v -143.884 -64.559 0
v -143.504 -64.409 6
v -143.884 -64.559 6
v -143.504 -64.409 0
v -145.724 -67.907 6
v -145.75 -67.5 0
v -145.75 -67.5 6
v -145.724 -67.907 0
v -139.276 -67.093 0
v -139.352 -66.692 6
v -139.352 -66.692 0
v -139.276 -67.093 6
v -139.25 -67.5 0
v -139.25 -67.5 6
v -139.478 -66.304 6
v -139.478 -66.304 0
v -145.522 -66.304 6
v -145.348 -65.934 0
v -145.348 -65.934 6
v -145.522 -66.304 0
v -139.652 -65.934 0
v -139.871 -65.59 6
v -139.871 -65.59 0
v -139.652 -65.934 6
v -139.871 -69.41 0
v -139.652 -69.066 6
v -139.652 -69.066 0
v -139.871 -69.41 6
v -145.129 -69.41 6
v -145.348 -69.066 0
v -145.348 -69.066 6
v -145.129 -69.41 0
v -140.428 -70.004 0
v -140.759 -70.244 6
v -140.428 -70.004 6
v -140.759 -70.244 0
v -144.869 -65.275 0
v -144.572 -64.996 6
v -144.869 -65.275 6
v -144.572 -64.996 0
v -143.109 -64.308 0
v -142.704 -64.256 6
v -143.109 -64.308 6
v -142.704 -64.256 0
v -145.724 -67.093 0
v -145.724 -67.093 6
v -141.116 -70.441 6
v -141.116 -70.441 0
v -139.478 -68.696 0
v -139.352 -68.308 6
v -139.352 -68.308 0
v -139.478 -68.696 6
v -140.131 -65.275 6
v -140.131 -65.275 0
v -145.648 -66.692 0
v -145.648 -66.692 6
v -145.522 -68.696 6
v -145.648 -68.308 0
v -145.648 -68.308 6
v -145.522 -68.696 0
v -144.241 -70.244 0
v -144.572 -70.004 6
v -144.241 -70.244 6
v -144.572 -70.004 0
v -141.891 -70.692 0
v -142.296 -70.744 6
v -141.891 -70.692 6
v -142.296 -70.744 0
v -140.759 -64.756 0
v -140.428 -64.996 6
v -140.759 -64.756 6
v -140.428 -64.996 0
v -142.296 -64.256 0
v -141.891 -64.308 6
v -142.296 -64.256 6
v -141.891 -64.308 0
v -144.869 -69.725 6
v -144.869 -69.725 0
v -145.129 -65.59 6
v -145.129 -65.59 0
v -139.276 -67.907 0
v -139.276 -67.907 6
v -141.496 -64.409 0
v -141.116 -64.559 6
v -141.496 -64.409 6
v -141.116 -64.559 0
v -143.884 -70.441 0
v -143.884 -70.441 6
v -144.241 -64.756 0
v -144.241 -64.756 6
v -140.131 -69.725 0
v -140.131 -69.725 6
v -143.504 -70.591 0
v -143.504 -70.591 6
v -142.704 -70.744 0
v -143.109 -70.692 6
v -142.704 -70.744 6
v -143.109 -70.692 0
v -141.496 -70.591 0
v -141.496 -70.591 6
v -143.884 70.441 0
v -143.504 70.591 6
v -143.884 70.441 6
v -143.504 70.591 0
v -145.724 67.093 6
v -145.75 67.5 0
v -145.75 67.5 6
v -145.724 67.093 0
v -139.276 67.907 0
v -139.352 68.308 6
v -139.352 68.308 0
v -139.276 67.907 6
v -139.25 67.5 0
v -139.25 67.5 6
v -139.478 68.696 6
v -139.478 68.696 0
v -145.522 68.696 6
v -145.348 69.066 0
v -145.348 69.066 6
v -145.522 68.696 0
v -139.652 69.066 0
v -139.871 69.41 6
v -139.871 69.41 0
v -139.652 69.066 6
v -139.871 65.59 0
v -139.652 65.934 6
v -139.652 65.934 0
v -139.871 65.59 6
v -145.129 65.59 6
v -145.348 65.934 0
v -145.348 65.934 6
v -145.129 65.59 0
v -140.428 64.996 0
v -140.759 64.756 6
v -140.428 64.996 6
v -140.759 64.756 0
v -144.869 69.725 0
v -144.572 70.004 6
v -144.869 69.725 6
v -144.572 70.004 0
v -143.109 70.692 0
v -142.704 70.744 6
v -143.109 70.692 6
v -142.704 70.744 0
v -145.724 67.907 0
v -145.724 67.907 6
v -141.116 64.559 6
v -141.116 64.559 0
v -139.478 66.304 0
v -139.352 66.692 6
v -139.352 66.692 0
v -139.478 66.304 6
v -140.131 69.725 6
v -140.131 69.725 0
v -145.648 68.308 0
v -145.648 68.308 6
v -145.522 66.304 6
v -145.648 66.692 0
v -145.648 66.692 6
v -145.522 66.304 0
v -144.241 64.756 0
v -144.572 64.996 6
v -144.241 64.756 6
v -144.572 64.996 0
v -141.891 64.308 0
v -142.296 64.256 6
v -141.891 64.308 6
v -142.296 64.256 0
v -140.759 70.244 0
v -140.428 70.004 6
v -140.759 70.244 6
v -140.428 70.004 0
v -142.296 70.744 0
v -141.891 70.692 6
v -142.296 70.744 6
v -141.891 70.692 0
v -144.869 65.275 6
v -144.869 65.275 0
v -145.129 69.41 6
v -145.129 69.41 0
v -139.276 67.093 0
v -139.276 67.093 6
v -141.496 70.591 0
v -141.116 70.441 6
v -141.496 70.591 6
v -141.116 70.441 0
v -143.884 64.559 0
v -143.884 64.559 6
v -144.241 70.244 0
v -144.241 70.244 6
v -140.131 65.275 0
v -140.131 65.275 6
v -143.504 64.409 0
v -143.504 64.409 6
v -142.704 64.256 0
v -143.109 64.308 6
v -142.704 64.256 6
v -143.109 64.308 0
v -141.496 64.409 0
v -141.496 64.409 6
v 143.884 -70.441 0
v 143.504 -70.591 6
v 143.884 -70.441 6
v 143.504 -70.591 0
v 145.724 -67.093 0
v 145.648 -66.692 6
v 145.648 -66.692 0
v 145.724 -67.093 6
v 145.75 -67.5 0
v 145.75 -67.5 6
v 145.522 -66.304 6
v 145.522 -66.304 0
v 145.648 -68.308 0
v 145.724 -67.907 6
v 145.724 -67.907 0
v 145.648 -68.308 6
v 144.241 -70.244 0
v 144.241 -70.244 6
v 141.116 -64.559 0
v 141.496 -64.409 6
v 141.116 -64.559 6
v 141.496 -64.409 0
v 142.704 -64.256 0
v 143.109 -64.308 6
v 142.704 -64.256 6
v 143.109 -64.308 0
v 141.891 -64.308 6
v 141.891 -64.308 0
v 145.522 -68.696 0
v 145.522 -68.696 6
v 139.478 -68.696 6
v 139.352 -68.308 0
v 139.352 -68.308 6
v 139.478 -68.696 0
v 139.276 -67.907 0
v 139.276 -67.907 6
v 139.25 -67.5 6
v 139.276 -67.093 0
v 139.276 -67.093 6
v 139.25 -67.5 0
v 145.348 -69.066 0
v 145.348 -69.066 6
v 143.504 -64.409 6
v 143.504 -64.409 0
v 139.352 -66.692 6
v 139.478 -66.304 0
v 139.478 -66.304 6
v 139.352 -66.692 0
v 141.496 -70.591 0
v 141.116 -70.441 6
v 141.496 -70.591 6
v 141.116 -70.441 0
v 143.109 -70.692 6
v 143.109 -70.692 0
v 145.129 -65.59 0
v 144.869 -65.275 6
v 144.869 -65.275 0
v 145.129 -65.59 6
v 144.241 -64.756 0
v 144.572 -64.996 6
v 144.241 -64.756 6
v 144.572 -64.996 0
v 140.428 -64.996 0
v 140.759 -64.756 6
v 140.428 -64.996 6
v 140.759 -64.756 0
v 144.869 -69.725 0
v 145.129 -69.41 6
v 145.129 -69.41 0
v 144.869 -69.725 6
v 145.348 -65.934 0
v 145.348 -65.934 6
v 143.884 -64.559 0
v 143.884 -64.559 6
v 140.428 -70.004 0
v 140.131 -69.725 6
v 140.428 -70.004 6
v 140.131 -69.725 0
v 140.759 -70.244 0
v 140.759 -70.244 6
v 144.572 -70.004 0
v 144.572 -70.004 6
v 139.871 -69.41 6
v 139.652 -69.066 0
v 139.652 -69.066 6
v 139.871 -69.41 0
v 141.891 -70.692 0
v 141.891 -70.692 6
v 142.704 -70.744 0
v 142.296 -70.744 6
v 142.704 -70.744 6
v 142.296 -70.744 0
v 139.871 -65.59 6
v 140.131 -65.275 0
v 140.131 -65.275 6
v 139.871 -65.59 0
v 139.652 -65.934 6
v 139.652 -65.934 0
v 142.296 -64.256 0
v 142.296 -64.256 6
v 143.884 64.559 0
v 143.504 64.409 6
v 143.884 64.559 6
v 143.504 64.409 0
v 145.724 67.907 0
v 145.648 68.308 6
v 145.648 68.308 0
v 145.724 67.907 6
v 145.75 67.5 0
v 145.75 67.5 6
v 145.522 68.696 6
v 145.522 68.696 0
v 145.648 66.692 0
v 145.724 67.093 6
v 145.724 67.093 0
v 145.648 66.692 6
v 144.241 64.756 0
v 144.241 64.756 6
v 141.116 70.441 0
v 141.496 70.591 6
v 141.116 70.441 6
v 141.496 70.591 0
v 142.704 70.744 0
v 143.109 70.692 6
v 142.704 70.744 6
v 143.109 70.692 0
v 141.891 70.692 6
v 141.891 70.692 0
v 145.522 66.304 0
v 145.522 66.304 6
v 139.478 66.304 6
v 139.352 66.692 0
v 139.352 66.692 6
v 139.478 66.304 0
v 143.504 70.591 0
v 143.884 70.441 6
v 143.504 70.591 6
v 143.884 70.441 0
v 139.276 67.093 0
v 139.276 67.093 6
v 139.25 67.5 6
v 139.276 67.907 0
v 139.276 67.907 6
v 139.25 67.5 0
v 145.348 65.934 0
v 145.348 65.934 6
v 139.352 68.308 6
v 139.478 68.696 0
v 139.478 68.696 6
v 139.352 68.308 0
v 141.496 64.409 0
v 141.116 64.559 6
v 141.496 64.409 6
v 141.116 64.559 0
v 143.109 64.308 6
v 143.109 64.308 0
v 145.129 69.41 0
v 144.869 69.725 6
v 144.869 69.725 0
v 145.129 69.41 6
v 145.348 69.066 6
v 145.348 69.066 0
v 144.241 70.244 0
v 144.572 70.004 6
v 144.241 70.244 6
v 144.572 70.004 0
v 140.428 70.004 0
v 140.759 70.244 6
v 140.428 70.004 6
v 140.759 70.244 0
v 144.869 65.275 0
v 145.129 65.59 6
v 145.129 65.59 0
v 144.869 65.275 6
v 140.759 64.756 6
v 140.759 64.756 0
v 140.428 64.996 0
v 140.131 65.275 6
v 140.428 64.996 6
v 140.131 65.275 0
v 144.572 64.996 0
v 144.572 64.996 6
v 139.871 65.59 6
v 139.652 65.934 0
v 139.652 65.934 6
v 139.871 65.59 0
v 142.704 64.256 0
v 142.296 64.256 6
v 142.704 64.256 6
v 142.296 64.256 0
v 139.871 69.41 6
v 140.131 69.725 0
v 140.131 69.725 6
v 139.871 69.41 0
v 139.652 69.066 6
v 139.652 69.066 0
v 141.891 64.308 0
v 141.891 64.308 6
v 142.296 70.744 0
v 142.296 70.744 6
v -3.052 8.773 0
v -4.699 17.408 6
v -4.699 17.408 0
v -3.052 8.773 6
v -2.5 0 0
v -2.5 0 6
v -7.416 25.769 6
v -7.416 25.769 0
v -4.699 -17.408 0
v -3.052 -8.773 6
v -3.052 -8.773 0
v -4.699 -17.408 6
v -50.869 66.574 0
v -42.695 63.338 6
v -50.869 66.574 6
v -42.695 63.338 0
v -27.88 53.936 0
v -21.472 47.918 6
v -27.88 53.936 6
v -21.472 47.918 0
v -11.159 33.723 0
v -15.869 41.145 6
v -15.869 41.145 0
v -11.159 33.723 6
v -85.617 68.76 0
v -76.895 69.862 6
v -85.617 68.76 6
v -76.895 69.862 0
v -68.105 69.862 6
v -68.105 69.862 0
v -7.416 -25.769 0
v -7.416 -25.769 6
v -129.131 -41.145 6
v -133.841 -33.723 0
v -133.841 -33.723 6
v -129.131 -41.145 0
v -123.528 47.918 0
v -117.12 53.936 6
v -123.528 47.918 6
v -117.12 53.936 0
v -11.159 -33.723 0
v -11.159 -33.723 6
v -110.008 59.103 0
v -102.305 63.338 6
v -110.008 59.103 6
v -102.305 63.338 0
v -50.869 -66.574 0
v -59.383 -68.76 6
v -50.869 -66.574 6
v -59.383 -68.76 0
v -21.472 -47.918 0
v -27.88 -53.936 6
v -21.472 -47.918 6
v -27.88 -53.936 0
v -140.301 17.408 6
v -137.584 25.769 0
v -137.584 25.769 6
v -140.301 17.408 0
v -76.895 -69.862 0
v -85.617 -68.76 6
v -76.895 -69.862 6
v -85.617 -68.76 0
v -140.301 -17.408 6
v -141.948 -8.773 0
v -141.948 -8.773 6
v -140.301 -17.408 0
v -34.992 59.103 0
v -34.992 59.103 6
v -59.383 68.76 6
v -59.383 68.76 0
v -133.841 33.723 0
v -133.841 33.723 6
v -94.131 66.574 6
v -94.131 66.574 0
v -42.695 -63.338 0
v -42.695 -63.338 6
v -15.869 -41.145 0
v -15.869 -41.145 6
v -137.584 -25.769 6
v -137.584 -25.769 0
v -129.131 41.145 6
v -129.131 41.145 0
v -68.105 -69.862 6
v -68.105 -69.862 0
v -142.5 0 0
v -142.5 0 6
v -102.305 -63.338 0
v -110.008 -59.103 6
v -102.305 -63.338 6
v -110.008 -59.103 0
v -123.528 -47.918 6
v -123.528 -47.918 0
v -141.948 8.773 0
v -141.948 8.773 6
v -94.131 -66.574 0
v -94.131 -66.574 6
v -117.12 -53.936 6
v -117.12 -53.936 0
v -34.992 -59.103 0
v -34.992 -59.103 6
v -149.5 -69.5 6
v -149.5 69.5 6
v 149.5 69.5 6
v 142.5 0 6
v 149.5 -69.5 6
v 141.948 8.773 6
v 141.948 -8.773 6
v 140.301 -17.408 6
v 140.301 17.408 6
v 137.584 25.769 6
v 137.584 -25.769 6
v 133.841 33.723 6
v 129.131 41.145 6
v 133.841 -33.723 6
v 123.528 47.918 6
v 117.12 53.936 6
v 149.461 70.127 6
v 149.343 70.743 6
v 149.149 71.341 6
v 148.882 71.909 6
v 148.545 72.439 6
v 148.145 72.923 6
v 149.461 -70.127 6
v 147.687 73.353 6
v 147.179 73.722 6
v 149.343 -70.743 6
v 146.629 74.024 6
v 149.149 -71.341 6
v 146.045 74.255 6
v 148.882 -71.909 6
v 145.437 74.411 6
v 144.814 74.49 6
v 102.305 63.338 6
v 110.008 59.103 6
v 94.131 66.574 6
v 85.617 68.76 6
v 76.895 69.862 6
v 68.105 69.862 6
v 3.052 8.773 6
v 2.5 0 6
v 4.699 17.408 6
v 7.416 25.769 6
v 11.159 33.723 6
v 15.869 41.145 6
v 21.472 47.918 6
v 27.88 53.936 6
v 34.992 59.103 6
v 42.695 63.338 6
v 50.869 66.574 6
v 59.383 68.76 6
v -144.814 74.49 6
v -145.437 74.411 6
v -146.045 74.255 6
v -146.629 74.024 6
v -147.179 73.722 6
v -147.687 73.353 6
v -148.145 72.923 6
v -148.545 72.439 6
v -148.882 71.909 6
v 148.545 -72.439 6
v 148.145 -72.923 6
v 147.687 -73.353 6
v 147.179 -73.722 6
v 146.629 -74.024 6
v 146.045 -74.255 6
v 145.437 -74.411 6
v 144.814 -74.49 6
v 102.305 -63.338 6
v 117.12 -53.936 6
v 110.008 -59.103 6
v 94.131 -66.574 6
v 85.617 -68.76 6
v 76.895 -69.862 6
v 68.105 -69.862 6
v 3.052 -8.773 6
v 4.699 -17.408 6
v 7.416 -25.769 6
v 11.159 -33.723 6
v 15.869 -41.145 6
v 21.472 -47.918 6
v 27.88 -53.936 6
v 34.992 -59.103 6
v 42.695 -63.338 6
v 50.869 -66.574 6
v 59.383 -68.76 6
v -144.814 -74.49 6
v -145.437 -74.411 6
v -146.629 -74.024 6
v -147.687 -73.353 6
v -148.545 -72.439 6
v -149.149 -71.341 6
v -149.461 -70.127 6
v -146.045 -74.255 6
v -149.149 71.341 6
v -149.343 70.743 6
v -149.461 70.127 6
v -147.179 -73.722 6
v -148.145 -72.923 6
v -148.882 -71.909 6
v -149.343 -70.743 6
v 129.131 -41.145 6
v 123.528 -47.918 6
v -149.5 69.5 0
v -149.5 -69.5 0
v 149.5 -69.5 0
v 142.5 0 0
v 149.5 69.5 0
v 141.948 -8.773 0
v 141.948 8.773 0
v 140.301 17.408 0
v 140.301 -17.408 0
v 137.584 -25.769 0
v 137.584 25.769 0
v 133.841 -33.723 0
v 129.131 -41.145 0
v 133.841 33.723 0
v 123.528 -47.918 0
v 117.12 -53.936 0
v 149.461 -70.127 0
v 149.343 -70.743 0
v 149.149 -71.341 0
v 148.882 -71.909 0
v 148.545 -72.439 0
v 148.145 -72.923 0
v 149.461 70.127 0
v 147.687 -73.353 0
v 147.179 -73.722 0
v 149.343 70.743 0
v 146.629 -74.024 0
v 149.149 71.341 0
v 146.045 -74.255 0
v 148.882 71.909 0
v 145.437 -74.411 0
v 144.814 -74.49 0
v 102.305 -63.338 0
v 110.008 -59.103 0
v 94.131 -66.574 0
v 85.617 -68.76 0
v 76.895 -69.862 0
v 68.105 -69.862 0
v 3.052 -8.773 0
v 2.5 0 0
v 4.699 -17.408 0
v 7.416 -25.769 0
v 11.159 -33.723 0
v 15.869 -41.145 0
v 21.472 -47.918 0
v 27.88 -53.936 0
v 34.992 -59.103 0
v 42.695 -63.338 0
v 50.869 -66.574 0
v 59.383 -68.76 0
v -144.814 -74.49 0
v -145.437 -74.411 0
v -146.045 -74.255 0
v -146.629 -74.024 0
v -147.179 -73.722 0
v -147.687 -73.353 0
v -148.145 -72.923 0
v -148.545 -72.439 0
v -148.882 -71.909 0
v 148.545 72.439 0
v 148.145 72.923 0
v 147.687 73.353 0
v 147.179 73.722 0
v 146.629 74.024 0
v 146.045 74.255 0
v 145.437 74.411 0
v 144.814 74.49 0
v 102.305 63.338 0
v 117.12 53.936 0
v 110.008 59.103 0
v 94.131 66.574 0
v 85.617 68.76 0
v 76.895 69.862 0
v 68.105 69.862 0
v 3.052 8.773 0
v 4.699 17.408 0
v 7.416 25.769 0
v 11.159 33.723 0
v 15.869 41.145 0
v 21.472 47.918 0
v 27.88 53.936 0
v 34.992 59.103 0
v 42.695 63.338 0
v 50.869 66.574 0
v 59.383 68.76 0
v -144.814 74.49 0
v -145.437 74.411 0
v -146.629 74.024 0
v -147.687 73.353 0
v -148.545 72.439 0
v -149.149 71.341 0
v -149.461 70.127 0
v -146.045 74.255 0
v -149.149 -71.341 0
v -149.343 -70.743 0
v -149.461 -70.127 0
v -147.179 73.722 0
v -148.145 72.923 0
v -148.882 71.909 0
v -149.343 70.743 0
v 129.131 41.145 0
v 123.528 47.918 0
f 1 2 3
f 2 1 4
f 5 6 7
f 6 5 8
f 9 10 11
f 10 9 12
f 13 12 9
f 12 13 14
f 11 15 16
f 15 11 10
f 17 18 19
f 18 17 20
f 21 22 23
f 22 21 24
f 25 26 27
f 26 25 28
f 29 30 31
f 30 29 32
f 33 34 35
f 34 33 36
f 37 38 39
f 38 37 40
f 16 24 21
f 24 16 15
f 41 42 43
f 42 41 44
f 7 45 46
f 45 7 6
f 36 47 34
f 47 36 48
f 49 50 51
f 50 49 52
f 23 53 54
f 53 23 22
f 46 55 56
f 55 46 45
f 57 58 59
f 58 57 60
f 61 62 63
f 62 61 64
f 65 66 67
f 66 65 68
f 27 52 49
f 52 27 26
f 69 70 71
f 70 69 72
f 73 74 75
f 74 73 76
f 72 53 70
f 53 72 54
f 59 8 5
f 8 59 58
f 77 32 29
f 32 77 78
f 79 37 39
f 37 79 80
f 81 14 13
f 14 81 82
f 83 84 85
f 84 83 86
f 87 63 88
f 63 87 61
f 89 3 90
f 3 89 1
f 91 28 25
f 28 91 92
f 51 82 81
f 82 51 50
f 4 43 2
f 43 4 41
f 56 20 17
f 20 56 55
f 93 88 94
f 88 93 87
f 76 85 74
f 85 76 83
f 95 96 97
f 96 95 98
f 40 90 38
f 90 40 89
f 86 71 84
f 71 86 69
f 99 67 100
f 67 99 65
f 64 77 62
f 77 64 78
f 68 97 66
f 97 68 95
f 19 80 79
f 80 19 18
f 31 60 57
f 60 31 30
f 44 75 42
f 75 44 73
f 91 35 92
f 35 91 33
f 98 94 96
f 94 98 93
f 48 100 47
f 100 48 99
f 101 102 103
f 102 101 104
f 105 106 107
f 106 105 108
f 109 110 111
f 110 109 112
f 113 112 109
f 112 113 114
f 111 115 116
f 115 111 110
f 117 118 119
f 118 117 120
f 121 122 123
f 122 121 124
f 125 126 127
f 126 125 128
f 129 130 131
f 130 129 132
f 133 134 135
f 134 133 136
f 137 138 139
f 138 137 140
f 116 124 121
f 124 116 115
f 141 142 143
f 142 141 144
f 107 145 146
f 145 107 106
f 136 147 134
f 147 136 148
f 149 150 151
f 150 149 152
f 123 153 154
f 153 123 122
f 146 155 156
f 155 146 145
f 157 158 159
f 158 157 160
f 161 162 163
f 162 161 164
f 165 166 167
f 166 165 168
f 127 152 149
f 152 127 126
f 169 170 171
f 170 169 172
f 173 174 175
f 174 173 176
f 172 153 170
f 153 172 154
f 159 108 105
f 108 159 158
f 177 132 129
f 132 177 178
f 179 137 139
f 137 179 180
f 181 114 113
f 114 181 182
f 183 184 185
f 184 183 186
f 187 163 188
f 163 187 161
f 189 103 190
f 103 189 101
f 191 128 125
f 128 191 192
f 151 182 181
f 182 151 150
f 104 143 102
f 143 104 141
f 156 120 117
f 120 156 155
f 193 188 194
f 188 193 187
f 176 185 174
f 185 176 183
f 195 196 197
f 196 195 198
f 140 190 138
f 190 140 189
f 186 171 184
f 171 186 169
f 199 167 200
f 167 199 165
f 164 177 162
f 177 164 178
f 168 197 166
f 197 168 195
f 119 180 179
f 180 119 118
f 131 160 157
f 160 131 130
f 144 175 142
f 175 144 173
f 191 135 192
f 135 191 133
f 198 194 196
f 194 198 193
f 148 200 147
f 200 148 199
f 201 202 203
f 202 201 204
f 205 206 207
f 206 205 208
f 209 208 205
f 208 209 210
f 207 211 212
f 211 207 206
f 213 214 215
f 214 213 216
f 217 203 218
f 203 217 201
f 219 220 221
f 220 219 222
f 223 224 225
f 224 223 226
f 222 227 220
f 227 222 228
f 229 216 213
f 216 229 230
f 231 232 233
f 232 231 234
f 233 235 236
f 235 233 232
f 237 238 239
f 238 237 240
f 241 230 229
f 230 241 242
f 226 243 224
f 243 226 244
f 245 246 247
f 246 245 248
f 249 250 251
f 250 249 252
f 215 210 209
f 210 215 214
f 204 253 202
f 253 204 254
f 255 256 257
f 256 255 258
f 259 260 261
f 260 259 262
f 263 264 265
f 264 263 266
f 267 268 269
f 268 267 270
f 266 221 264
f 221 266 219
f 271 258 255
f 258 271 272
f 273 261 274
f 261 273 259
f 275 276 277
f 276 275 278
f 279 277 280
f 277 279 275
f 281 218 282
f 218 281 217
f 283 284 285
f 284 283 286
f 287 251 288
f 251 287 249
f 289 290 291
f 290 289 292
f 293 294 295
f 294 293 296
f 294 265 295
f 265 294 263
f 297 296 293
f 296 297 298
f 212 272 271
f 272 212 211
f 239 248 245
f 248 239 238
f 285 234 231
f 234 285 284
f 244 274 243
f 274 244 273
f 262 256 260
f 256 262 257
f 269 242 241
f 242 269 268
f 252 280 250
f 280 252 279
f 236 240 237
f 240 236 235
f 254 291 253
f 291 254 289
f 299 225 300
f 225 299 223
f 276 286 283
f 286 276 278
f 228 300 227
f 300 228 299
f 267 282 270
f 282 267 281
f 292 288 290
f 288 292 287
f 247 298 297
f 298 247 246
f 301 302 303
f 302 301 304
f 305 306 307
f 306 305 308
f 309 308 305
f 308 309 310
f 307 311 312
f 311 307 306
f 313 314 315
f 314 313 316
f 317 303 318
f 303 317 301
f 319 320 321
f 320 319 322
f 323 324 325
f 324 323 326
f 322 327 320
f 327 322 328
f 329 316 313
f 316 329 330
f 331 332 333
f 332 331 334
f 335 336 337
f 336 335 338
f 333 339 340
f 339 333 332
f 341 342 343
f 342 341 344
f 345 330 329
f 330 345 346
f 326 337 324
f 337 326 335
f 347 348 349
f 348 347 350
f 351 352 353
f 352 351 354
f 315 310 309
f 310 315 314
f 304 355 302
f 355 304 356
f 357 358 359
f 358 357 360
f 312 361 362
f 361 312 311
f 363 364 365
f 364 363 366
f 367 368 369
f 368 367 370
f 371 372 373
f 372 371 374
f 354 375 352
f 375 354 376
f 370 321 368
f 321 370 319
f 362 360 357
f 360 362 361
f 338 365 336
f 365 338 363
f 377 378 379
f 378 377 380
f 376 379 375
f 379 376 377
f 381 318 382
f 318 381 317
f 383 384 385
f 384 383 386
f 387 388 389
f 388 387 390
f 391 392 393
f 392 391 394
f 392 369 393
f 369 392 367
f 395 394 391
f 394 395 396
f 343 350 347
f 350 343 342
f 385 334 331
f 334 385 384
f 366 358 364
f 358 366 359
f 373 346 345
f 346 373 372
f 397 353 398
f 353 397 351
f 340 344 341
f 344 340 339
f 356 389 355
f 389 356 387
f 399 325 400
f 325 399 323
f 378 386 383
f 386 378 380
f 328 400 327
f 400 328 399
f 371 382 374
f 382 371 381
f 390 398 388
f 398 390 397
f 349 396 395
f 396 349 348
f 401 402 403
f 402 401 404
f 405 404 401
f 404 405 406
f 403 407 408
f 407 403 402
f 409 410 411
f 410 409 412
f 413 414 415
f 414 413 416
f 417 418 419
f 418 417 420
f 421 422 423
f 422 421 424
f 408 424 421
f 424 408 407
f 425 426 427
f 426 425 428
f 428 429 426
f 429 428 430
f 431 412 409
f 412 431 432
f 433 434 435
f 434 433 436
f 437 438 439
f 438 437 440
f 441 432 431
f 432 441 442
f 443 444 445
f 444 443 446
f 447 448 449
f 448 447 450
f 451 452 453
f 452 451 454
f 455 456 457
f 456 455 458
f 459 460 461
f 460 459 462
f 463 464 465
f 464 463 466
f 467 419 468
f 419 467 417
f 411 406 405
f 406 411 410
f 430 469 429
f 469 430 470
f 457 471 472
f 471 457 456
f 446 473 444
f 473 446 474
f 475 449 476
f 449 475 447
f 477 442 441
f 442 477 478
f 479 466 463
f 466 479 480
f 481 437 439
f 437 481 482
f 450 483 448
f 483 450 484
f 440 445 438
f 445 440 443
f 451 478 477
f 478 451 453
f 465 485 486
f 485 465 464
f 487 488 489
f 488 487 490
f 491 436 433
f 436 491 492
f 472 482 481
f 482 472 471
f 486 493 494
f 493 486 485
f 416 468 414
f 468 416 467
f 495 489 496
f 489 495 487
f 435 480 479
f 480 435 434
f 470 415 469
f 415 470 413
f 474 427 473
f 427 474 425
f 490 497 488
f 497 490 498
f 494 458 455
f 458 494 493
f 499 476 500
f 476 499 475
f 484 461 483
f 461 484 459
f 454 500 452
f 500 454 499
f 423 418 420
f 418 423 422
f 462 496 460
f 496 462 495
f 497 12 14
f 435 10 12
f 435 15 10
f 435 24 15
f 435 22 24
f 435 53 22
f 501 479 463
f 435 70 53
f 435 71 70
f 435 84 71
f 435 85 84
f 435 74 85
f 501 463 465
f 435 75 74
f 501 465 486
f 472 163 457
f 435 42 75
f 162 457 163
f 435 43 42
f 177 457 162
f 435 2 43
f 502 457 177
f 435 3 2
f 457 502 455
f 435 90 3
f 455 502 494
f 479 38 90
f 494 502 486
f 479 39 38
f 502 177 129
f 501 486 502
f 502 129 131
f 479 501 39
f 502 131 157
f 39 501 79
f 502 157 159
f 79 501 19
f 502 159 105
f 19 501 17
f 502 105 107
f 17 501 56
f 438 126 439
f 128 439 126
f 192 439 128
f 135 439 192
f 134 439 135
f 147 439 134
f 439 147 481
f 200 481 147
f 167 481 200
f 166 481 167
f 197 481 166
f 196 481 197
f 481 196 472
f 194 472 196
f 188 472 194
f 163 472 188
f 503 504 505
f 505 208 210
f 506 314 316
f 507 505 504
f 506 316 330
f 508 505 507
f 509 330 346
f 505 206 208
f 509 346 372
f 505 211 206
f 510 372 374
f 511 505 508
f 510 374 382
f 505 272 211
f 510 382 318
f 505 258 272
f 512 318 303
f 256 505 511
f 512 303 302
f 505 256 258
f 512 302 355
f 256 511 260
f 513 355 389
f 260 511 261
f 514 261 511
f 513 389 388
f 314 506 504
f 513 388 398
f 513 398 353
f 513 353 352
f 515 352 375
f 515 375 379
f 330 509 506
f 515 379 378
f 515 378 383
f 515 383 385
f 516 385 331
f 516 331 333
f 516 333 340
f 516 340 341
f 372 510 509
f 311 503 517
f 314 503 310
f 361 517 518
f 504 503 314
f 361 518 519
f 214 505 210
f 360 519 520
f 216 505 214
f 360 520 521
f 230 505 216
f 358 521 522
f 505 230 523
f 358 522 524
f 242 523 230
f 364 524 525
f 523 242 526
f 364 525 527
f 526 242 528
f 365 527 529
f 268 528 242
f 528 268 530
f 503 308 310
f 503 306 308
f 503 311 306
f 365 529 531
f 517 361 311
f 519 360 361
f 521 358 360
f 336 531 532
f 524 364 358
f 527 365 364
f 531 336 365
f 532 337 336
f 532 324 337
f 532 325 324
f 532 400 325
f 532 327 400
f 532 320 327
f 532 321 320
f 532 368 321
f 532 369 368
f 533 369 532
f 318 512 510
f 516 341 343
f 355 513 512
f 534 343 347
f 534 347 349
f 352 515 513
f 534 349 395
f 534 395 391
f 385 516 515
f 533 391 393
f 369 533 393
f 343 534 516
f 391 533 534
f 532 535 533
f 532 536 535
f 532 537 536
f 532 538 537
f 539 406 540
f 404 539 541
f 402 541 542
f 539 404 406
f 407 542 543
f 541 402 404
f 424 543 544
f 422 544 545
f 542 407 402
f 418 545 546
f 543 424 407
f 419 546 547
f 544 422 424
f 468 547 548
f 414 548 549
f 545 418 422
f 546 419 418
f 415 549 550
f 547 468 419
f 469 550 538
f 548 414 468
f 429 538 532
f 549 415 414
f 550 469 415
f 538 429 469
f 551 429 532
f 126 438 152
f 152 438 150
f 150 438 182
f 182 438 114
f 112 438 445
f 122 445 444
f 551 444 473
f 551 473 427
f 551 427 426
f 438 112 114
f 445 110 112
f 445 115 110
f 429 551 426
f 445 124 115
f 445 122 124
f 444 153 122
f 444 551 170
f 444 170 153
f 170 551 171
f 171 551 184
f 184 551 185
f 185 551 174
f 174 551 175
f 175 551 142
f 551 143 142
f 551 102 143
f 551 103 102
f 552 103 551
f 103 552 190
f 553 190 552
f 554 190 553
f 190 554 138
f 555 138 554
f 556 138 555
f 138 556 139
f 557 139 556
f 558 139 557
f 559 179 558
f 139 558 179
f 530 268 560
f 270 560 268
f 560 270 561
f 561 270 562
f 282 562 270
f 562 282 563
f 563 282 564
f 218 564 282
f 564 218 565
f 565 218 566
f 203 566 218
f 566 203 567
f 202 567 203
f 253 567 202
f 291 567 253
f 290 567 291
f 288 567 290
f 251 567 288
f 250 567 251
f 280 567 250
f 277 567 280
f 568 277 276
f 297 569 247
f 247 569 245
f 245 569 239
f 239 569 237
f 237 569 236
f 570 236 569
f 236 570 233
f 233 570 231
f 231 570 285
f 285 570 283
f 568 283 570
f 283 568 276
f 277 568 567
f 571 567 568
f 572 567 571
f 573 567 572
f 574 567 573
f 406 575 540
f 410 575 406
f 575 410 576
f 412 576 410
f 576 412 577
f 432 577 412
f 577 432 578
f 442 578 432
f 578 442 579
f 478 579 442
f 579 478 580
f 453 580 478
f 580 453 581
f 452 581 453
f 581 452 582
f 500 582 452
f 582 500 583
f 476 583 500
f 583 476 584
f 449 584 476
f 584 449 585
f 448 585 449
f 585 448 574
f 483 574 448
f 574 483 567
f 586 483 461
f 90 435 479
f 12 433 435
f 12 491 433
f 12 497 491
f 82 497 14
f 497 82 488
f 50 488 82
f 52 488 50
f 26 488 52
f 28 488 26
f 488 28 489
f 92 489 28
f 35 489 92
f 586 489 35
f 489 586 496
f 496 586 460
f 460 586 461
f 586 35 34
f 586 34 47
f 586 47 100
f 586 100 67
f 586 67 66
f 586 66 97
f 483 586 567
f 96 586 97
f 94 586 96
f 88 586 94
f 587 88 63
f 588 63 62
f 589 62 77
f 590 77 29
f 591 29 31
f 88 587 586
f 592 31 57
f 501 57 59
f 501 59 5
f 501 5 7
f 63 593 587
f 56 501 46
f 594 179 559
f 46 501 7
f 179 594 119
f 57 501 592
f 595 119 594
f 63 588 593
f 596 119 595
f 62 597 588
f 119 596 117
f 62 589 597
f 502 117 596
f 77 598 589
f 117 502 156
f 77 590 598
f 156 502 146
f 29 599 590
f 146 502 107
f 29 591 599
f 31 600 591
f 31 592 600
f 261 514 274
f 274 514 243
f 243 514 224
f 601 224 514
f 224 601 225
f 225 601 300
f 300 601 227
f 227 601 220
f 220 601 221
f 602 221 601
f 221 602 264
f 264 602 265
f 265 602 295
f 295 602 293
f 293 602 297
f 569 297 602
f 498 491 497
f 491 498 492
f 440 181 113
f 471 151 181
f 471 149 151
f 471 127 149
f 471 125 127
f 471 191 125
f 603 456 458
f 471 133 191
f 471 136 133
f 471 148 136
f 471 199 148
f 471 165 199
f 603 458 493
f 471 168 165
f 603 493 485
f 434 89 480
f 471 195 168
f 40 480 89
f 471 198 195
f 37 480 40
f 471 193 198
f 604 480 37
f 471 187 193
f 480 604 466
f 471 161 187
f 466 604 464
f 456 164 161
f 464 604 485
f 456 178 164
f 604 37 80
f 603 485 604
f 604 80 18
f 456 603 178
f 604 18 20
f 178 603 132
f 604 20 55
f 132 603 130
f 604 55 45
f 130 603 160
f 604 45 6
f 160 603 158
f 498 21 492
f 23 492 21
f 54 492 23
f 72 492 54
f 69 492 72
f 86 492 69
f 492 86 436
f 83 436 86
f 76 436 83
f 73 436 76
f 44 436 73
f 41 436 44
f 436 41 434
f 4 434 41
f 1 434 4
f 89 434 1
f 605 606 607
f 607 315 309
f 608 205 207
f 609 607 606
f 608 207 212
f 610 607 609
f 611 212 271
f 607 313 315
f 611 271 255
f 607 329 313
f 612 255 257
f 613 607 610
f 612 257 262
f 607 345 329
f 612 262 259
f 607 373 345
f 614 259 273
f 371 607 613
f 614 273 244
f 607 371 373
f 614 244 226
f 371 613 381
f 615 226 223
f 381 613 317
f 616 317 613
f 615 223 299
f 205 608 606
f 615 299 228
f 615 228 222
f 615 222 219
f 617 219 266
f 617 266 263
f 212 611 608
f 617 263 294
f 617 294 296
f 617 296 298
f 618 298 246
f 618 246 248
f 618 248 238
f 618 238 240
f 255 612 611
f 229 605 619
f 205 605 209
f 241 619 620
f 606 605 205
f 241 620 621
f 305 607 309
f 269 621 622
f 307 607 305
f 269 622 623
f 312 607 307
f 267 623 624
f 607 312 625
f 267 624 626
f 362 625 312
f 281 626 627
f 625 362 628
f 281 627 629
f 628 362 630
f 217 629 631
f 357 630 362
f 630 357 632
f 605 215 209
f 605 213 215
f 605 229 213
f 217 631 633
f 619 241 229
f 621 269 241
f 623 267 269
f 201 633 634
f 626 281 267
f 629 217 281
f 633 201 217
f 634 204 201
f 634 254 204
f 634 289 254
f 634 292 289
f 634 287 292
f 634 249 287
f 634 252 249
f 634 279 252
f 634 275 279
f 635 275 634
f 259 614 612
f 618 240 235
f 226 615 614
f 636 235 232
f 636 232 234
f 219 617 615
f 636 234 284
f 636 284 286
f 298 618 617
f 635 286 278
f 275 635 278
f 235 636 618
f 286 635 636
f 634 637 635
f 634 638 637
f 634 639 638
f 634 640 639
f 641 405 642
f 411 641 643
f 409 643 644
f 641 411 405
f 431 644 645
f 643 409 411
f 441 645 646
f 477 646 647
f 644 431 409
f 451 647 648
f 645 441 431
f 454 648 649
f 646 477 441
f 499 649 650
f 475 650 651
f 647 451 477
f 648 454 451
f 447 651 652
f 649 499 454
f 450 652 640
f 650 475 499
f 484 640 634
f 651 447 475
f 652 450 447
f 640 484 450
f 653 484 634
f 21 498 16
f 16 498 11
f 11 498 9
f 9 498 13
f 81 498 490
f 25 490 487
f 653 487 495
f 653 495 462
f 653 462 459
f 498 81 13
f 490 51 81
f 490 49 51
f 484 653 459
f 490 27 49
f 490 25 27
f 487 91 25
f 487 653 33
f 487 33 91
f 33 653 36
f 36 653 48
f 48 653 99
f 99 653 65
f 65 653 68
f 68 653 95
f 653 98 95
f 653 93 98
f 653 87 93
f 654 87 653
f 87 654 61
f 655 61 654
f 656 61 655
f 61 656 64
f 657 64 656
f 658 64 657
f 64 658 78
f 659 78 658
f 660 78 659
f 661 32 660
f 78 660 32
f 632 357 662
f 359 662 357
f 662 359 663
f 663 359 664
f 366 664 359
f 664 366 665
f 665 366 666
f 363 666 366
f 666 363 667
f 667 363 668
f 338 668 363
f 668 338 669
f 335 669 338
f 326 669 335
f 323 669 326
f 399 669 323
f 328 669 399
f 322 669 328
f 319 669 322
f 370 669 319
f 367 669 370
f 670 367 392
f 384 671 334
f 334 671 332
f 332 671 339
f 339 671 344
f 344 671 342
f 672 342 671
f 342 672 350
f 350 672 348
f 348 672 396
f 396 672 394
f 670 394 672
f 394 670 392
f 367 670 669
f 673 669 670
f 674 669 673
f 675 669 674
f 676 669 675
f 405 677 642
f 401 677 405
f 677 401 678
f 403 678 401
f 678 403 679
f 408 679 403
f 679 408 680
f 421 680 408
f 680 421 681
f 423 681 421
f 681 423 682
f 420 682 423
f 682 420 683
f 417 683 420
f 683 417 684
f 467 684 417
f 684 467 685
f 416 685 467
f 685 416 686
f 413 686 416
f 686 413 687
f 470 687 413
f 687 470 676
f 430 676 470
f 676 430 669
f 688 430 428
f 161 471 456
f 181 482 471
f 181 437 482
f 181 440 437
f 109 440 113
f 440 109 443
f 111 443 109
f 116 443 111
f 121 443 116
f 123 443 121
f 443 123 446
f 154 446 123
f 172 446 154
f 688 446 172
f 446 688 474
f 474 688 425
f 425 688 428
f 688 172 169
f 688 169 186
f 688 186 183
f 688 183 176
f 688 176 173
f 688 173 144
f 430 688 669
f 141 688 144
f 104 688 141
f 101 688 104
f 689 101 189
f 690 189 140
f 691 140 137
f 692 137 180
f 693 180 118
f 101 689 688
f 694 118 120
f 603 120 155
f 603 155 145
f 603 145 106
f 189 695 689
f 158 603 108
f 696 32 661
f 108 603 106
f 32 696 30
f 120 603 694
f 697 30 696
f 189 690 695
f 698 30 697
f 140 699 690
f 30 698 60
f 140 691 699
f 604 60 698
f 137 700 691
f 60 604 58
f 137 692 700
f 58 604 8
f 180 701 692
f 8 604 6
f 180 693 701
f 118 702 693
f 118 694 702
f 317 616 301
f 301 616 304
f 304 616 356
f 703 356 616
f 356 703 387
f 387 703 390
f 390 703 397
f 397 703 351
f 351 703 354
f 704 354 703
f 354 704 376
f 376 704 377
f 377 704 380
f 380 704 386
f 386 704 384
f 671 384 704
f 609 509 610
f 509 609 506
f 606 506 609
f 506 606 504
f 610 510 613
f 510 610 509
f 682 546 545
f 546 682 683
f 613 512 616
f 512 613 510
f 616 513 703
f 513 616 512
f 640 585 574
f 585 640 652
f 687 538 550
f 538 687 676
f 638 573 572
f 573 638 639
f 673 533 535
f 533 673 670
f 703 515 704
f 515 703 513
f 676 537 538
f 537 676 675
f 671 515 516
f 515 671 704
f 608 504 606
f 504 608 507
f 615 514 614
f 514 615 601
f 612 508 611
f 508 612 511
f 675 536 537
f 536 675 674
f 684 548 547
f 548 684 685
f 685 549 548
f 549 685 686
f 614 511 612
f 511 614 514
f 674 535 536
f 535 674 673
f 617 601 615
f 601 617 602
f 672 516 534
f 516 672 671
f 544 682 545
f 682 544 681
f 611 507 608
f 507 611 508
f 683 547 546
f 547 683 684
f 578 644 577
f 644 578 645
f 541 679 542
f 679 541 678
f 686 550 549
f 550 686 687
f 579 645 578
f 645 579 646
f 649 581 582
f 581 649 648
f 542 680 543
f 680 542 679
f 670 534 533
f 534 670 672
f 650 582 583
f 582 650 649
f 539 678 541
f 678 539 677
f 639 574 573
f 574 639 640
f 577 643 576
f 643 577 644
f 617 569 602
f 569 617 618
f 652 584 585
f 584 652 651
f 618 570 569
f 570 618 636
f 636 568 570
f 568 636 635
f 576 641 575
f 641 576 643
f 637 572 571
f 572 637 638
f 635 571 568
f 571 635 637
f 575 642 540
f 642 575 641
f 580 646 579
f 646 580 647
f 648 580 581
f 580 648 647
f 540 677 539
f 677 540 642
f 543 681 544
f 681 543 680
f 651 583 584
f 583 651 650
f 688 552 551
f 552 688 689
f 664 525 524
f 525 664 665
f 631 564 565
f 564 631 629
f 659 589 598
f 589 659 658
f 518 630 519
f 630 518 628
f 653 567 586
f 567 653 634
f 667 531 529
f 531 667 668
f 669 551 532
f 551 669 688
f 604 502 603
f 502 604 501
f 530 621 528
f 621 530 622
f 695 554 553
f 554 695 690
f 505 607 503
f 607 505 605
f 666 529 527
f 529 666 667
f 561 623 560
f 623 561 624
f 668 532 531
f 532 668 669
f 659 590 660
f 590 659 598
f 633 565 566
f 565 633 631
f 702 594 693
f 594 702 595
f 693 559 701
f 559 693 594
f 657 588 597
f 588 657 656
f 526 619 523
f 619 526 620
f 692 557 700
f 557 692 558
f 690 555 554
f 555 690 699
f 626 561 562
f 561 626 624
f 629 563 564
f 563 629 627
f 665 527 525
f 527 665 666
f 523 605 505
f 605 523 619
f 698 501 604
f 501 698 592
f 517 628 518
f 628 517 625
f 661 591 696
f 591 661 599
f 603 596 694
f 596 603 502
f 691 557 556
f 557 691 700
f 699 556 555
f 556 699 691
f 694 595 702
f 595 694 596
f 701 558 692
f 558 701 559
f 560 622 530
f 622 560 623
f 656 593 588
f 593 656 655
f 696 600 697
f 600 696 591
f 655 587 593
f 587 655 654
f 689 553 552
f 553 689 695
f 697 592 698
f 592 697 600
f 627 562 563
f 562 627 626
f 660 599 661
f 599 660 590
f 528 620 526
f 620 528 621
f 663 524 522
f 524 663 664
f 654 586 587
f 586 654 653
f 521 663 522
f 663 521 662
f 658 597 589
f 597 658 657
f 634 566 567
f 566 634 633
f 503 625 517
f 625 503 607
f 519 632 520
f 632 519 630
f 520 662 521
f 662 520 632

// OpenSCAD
$fn = 50;


difference() {
	union() {
		hull() {
			translate(v = [-144.5000000000, 69.5000000000, 0]) {
				cylinder(h = 6, r = 5);
			}
			translate(v = [144.5000000000, 69.5000000000, 0]) {
				cylinder(h = 6, r = 5);
			}
			translate(v = [-144.5000000000, -69.5000000000, 0]) {
				cylinder(h = 6, r = 5);
			}
			translate(v = [144.5000000000, -69.5000000000, 0]) {
				cylinder(h = 6, r = 5);
			}
		}
	}
	union() {
		#translate(v = [-142.5000000000, -67.5000000000, -100.0000000000]) {
			cylinder(h = 200, r = 3.2500000000);
		}
		#translate(v = [-142.5000000000, 67.5000000000, -100.0000000000]) {
			cylinder(h = 200, r = 3.2500000000);
		}
		#translate(v = [142.5000000000, -67.5000000000, -100.0000000000]) {
			cylinder(h = 200, r = 3.2500000000);
		}
		#translate(v = [142.5000000000, 67.5000000000, -100.0000000000]) {
			cylinder(h = 200, r = 3.2500000000);
		}
		#translate(v = [-72.5000000000, 0, 0]) {
			cylinder(h = 6, r = 70.0000000000);
		}
		#translate(v = [72.5000000000, 0, 0]) {
			cylinder(h = 6, r = 70.0000000000);
		}
	}
}
